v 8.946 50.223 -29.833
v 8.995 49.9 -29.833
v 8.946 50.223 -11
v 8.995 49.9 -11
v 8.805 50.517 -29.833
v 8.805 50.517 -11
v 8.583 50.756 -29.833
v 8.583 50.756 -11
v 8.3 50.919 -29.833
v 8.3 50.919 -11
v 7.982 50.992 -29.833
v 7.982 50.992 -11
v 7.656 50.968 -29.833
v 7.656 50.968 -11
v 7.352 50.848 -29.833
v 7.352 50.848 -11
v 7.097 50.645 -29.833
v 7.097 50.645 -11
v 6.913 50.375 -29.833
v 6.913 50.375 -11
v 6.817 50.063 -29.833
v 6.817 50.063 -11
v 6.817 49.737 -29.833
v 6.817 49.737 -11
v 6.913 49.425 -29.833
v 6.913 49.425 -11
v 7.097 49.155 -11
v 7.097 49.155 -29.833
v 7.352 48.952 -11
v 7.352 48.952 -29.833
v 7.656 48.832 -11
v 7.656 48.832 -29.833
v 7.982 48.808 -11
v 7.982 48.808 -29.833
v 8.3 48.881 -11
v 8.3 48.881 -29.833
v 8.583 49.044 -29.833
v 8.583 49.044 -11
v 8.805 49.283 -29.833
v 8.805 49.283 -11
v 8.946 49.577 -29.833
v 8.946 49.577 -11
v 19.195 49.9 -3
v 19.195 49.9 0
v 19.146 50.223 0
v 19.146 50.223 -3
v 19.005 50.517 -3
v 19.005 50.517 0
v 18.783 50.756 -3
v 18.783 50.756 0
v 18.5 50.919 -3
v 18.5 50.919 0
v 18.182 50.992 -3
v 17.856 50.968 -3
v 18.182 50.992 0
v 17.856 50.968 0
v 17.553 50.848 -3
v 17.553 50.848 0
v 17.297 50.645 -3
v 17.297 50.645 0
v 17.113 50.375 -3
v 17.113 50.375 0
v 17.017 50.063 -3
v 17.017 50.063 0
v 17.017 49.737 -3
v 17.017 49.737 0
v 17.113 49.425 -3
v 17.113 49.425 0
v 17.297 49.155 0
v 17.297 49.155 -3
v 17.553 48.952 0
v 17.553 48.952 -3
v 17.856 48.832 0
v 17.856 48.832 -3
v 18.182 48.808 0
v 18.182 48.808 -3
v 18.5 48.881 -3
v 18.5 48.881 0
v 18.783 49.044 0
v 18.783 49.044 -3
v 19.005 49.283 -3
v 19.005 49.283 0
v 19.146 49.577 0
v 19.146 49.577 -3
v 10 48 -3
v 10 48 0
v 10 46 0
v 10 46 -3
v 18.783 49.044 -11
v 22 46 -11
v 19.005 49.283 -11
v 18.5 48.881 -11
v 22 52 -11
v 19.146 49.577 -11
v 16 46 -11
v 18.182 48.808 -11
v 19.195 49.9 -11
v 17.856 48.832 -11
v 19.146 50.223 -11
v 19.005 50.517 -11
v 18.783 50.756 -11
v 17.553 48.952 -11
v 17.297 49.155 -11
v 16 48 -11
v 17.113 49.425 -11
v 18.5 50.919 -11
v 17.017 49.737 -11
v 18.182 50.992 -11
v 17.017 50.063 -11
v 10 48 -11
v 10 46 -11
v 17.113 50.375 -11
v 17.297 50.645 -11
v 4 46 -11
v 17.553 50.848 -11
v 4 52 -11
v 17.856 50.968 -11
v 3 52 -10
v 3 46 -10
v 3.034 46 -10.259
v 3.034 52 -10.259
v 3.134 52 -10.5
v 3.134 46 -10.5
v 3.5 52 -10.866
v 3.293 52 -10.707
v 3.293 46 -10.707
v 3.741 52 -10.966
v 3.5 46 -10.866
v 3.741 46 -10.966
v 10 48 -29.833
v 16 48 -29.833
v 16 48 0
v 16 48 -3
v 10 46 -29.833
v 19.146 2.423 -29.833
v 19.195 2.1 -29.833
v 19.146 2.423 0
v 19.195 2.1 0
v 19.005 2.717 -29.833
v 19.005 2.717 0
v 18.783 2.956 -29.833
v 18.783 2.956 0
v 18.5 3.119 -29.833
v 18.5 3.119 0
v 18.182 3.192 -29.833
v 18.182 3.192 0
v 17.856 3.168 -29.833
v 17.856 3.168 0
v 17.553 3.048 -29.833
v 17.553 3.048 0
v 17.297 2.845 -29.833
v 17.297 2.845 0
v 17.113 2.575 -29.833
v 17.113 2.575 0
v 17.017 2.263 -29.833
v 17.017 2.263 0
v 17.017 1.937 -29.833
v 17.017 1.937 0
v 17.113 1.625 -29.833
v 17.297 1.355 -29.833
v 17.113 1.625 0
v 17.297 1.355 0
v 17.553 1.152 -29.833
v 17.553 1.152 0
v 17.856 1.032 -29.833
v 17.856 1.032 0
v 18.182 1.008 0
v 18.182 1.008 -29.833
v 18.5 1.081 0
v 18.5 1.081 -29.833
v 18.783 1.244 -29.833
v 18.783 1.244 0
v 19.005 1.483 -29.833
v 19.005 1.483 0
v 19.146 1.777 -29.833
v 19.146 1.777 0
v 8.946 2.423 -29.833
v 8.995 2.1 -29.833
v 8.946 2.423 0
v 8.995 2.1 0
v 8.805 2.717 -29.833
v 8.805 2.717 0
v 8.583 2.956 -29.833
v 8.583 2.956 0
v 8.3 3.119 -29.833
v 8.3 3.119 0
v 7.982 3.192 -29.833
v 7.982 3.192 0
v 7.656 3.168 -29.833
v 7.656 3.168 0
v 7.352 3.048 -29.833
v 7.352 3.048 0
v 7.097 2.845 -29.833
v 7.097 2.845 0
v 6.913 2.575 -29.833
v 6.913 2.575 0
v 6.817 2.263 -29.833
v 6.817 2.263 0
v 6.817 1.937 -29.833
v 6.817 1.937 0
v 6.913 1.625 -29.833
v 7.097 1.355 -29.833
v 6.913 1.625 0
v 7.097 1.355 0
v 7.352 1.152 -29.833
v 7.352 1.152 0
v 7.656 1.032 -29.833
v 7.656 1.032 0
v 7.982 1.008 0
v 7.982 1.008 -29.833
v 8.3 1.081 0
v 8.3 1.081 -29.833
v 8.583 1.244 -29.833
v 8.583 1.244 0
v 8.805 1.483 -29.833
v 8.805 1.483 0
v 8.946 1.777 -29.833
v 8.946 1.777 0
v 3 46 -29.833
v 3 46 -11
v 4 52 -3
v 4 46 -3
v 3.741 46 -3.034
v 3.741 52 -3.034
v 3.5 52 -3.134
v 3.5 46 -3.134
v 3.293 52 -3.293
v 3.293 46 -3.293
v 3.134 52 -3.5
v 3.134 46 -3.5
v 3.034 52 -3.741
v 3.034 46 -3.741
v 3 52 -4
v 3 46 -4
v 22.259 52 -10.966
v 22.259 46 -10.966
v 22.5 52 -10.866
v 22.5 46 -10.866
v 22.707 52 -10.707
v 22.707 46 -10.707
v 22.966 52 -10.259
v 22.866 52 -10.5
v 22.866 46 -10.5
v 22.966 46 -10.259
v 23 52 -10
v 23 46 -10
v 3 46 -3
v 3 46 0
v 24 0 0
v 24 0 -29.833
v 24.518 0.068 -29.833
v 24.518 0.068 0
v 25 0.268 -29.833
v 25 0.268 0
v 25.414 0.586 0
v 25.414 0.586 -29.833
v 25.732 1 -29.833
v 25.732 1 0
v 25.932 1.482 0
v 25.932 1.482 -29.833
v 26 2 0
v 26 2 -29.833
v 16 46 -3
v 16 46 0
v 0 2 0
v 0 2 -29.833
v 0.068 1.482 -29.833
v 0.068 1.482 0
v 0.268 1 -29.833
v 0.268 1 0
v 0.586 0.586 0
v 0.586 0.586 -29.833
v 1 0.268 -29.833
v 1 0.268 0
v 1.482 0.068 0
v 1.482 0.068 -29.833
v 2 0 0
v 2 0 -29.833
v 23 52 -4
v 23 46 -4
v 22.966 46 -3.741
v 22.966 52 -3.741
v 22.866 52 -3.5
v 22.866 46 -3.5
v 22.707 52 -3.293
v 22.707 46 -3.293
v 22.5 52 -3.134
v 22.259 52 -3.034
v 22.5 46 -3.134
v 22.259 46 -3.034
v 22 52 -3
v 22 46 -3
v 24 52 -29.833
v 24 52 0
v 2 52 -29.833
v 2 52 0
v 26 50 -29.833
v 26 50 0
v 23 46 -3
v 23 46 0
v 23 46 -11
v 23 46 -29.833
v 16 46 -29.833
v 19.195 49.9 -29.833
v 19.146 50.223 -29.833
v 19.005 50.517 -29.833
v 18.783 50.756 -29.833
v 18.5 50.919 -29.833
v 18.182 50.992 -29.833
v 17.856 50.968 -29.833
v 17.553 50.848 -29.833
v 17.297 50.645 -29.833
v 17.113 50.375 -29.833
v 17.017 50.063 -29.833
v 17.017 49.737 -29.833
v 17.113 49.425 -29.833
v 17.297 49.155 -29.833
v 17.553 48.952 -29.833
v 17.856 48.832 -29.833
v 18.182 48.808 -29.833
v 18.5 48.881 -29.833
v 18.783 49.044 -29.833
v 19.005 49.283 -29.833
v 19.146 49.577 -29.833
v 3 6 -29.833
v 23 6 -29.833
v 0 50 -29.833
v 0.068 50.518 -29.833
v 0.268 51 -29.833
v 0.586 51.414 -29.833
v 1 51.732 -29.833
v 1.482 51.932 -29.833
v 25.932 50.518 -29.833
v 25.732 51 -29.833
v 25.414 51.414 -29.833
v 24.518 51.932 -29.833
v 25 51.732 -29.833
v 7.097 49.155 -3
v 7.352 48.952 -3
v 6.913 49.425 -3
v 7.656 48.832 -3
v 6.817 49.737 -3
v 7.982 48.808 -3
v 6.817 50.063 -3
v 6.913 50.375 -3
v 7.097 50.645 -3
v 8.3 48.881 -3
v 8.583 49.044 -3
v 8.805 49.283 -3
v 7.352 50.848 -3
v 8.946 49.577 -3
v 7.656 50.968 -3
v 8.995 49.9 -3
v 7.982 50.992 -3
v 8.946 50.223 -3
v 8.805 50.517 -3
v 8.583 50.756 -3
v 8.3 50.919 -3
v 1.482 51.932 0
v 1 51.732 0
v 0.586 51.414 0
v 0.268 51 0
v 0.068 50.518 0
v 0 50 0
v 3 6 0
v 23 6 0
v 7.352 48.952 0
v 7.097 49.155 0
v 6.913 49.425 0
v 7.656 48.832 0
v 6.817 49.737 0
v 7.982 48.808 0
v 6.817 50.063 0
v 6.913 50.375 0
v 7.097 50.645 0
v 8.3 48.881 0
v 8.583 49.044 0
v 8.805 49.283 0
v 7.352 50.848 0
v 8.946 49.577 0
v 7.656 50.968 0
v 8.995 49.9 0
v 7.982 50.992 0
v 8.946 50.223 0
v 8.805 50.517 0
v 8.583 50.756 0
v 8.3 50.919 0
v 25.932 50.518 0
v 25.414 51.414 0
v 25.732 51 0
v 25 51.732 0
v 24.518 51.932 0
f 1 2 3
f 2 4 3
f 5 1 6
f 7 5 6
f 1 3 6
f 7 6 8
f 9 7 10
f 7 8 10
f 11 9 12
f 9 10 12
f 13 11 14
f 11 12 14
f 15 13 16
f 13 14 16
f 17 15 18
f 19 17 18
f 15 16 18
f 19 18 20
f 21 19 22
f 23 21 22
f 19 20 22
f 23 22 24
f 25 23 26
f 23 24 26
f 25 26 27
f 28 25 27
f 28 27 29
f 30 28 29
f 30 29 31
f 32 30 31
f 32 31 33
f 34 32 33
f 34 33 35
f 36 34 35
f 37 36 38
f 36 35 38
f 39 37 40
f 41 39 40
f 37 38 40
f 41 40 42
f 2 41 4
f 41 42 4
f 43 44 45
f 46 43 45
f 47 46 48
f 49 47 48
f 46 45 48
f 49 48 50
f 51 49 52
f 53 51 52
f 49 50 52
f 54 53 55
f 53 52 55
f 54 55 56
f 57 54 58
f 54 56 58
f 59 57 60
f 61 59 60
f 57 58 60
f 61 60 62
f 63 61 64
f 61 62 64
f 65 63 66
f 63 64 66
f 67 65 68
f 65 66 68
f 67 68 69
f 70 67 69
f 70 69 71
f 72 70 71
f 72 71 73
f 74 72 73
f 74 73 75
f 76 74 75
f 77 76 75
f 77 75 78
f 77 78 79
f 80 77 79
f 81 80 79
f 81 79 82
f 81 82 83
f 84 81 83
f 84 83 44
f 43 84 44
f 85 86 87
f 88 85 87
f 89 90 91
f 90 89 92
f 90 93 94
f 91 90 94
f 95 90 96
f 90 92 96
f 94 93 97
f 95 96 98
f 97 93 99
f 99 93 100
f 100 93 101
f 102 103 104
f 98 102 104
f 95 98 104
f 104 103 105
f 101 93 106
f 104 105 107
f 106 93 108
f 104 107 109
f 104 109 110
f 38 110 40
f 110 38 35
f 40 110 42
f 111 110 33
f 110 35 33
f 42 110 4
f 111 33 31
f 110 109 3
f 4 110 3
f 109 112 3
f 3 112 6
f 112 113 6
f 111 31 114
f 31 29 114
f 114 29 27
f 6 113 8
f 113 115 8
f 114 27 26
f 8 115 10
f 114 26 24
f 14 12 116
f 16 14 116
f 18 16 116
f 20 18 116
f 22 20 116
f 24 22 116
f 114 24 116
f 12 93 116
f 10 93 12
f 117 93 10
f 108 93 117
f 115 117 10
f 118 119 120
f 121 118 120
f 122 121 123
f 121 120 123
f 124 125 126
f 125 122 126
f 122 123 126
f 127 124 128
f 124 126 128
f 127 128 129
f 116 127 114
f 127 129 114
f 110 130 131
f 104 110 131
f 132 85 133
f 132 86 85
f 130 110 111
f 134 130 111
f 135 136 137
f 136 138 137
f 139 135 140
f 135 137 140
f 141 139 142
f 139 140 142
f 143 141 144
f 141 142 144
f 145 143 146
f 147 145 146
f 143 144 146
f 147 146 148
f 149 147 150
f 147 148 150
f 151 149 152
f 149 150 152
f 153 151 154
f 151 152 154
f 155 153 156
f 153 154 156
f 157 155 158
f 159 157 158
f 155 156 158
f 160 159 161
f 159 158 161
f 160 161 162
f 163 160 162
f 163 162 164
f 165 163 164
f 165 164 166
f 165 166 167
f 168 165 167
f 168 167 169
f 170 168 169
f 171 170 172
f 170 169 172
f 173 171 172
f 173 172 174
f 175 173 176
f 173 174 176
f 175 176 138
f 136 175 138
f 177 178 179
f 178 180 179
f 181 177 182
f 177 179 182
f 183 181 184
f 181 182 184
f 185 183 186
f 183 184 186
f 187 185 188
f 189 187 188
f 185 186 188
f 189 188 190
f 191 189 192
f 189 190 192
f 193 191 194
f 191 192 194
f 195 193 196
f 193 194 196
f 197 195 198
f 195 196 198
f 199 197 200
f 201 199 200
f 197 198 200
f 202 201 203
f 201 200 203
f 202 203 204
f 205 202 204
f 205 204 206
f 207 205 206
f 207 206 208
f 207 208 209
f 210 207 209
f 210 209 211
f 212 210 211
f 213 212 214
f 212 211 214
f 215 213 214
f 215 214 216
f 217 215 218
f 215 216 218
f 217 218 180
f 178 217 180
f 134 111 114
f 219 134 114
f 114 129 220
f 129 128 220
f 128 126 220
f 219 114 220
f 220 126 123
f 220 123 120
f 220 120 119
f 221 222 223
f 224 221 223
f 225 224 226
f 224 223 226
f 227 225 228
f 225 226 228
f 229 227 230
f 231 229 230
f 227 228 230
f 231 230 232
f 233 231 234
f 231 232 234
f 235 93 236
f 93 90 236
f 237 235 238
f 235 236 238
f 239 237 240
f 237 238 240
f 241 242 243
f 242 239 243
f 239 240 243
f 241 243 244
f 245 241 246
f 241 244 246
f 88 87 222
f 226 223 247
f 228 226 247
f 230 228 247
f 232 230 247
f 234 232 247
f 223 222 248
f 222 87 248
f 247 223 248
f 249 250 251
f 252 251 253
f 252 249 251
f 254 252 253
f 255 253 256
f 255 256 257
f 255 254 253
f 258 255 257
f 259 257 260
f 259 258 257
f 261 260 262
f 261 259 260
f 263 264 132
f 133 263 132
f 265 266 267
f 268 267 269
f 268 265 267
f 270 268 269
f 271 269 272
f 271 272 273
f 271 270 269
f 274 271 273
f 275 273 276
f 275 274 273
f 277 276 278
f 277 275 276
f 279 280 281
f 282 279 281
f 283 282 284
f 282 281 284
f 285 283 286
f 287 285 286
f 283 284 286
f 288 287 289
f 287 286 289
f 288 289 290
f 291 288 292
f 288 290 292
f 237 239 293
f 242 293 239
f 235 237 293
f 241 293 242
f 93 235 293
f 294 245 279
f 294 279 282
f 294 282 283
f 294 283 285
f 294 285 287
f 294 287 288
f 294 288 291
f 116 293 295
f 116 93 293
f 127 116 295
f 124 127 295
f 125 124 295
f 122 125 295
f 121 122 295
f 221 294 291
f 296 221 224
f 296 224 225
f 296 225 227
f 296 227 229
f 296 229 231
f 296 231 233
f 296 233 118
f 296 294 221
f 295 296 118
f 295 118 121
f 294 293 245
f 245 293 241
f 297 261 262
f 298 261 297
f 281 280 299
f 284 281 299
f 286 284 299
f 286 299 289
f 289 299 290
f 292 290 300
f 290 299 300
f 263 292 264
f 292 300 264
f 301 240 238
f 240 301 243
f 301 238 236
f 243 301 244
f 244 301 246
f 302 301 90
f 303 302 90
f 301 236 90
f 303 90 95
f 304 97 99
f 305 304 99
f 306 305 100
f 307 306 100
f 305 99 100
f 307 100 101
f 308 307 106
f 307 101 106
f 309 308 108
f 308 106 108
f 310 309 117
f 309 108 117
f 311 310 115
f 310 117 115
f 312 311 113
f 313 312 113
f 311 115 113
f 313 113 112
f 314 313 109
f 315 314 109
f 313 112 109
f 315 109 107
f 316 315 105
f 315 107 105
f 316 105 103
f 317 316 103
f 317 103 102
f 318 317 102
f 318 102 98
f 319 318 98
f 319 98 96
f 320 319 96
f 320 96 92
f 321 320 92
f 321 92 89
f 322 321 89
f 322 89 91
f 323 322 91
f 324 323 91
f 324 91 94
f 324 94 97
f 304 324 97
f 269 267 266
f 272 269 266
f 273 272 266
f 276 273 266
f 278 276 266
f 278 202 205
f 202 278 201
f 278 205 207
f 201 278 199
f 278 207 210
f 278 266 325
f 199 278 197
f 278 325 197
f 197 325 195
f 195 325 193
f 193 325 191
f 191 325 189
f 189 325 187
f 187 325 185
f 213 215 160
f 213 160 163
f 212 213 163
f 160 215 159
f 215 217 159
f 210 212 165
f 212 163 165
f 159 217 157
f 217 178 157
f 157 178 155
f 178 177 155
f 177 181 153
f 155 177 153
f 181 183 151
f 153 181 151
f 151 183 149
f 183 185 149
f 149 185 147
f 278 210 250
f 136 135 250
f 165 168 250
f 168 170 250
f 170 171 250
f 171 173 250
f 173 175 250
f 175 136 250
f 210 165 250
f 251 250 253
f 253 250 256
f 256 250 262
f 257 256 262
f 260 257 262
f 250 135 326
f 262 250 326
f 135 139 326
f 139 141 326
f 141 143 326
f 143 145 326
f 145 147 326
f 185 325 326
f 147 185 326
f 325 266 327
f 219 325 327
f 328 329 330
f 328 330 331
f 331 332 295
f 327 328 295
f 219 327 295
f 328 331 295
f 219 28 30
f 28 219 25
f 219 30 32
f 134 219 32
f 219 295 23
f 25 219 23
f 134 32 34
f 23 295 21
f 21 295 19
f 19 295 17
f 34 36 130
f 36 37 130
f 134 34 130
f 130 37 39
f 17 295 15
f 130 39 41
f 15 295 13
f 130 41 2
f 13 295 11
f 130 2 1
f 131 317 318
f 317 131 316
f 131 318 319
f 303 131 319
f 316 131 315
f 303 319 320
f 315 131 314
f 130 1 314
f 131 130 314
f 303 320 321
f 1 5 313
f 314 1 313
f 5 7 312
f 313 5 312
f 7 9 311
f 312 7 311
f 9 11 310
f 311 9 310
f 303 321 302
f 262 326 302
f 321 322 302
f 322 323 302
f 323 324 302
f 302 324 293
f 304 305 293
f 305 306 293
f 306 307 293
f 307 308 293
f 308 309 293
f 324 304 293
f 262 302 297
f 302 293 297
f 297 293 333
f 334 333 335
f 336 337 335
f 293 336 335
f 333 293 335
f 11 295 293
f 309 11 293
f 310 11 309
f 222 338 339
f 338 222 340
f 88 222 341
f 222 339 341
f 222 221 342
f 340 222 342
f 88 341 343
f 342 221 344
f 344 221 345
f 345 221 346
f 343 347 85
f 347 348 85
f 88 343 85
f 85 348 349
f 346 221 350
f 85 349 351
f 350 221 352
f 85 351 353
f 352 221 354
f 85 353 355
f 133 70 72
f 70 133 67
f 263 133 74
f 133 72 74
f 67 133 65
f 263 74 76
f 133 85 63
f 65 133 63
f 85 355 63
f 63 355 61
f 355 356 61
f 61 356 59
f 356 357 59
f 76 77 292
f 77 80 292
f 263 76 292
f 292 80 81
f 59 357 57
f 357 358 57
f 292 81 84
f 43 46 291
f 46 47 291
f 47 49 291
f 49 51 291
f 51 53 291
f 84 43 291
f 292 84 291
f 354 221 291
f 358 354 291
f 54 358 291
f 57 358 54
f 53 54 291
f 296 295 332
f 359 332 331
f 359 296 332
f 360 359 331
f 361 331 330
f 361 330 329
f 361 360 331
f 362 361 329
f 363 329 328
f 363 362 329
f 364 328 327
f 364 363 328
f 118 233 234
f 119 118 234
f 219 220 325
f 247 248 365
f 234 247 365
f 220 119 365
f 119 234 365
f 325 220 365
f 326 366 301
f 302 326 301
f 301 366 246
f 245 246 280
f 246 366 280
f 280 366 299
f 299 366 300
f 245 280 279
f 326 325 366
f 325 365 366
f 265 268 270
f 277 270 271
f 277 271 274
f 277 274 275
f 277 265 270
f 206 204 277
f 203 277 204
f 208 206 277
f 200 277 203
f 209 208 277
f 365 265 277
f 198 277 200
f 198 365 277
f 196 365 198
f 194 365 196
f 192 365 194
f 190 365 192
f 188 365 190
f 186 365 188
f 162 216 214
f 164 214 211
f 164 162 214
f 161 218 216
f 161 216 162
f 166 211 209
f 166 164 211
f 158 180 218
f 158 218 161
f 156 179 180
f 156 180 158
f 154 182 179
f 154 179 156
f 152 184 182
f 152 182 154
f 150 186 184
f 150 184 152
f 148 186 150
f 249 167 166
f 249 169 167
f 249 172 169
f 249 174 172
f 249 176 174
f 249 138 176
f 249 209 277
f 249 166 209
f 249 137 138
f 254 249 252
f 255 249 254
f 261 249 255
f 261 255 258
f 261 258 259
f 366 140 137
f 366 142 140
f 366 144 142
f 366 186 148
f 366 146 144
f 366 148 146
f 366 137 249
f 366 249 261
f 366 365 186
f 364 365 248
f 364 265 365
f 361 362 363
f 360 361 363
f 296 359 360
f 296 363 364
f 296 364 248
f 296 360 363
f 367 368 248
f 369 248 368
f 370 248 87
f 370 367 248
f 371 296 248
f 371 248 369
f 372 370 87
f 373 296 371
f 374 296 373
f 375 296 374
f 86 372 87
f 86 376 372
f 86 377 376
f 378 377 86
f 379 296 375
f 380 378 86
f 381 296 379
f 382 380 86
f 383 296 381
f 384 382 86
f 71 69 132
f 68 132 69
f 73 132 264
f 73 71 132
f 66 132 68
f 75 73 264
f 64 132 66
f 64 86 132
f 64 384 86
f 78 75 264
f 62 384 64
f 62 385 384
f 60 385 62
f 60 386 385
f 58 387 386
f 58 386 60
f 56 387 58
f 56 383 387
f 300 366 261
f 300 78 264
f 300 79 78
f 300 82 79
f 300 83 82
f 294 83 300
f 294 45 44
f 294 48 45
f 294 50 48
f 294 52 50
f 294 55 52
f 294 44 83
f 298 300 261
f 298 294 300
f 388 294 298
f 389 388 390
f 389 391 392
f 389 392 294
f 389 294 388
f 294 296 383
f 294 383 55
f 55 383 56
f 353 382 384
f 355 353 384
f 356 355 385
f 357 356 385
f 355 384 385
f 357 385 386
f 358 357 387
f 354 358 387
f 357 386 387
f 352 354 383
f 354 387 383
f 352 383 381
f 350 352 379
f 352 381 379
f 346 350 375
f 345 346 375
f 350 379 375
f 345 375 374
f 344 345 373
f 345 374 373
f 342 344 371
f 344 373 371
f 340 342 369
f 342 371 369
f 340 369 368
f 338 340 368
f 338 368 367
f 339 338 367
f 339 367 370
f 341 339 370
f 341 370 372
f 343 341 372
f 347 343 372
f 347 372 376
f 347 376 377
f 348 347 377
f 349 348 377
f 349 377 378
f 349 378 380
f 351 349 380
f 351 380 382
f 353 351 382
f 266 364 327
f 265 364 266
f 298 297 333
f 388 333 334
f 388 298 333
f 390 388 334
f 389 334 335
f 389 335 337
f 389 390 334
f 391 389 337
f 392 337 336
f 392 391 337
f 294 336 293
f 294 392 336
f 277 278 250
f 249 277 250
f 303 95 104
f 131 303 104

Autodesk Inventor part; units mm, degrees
ref_plane "YZ Plane" through (0, 0, 0) normal (1, 0, 0) x (0, 1, 0)
ref_plane "XZ Plane" through (0, 0, 0) normal (0, 1, 0) x (-1, 0, 0)
ref_plane "XY Plane" through (0, 0, 0) normal (0, 0, 1) x (1, 0, 0)
sketch "Sketch6" plane through (0, 0, 0) normal (0, 0, 1) x (1, 0, 0)
  line L0 (2, 0) -> (24, 0)
  line L1 (24, 52) -> (2, 52)
  line L2 (0, 50) -> (0, 2)
  line L3 (3, 6) -> (23, 6)
  line L4 (23, 6) -> (23, 46)
  line L5 (13, 6) -> (13, 46) construction
  line L6 (16, 46) -> (16, 48)
  line L7 (10, 48) -> (10, 46)
  line L8 (23, 46) -> (16, 46)
  line L9 (10, 46) -> (3, 46)
  arc A0 (2, 52) -> (0, 50) centre (2, 50) ccw
  arc A1 (26, 50) -> (24, 52) centre (24, 50) ccw
  arc A2 (24, 0) -> (26, 2) centre (24, 2) ccw
  arc A3 (0, 2) -> (2, 0) centre (2, 2) ccw
  line L10 (3, 26) -> (23, 26) construction
  line L11 (26, 2) -> (26, 50)
  line L12 (3, 46) -> (3, 6)
  line L13 (10, 48) -> (16, 48)
  point P0 (0, 0)
  dimension "d122" = 52
  dimension "d126" = 6
  dimension "d127" = 6
  dimension "d131" = 3
  dimension "d132" = 2
  dimension "d159" = 13
  dimension "d162" = 10
  dimension "d163" = 10
  dimension "d164" = 3
  dimension "d165" = 3
  dimension "d166" = 20
  dimension "d167" = 40
extrude "Extrusion3" add sketch "Sketch6" against normal blind 29.833
sketch "Sketch7" plane through (0, 0, 0) normal (0, 0, 1) x (1, 0, 0)
  point P0 (0, 0)
sketch "Sketch8" plane through (0, 0, 0) normal (0, 0, 1) x (1, 0, 0)
  circle A0 centre (7.9, 49.9) radius 1.095
  circle A1 centre (18.1, 49.9) radius 1.095
  line L0 (3, 46) -> (10, 46) projected
  line L1 (16, 46) -> (23, 46) projected
  line L2 (10, 48) -> (16, 48) projected
  line L3 (13, 48) -> (13, 6) construction
  line L4 (3, 6) -> (23, 6) projected
  line L5 (5, 6) -> (5, 46) projected
  line L6 (5, 26) -> (23, 26) construction
  line L7 (23, 46) -> (23, 6) projected
  circle A2 centre (7.9, 2.1) radius 1.095
  circle A3 centre (18.1, 2.1) radius 1.095
  point P0 (0, 0)
  dimension "d149" = 2.19
  dimension "d150" = 2.19
  dimension "d151" = 3.9
  dimension "d152" = 3.9
  dimension "d153" = 5.1
  dimension "d154" = 5.1
extrude "Extrusion4" cut sketch "Sketch8" against normal blind 33.25
sketch "Sketch9" plane through (2, 52, 0) normal (0, 1, 0) x (1, 0, 0)
  line L0 (1, 3) -> (21, 3)
  line L1 (21, 3) -> (21, 11)
  line L2 (21, 11) -> (1, 11)
  line L3 (1, 11) -> (1, 3)
  line L4 (22, 0) -> (0, 0) projected
  line L5 (0, 0) -> (0, 29.833) projected
  point P0 (-2, 0)
  dimension "d168" = 20
  dimension "d169" = 8
  dimension "d171" = 3
  dimension "d172" = 1
extrude "Extrusion5" cut sketch "Sketch9" against normal blind 6
fillet "Fillet1" radius 1 1 edges at (23, 49, -11)
fillet "Fillet2" radius 1 3 edges at (23, 49, -3) (3, 49, -11) (3, 49, -3)
properties part number "NewServoMount"
